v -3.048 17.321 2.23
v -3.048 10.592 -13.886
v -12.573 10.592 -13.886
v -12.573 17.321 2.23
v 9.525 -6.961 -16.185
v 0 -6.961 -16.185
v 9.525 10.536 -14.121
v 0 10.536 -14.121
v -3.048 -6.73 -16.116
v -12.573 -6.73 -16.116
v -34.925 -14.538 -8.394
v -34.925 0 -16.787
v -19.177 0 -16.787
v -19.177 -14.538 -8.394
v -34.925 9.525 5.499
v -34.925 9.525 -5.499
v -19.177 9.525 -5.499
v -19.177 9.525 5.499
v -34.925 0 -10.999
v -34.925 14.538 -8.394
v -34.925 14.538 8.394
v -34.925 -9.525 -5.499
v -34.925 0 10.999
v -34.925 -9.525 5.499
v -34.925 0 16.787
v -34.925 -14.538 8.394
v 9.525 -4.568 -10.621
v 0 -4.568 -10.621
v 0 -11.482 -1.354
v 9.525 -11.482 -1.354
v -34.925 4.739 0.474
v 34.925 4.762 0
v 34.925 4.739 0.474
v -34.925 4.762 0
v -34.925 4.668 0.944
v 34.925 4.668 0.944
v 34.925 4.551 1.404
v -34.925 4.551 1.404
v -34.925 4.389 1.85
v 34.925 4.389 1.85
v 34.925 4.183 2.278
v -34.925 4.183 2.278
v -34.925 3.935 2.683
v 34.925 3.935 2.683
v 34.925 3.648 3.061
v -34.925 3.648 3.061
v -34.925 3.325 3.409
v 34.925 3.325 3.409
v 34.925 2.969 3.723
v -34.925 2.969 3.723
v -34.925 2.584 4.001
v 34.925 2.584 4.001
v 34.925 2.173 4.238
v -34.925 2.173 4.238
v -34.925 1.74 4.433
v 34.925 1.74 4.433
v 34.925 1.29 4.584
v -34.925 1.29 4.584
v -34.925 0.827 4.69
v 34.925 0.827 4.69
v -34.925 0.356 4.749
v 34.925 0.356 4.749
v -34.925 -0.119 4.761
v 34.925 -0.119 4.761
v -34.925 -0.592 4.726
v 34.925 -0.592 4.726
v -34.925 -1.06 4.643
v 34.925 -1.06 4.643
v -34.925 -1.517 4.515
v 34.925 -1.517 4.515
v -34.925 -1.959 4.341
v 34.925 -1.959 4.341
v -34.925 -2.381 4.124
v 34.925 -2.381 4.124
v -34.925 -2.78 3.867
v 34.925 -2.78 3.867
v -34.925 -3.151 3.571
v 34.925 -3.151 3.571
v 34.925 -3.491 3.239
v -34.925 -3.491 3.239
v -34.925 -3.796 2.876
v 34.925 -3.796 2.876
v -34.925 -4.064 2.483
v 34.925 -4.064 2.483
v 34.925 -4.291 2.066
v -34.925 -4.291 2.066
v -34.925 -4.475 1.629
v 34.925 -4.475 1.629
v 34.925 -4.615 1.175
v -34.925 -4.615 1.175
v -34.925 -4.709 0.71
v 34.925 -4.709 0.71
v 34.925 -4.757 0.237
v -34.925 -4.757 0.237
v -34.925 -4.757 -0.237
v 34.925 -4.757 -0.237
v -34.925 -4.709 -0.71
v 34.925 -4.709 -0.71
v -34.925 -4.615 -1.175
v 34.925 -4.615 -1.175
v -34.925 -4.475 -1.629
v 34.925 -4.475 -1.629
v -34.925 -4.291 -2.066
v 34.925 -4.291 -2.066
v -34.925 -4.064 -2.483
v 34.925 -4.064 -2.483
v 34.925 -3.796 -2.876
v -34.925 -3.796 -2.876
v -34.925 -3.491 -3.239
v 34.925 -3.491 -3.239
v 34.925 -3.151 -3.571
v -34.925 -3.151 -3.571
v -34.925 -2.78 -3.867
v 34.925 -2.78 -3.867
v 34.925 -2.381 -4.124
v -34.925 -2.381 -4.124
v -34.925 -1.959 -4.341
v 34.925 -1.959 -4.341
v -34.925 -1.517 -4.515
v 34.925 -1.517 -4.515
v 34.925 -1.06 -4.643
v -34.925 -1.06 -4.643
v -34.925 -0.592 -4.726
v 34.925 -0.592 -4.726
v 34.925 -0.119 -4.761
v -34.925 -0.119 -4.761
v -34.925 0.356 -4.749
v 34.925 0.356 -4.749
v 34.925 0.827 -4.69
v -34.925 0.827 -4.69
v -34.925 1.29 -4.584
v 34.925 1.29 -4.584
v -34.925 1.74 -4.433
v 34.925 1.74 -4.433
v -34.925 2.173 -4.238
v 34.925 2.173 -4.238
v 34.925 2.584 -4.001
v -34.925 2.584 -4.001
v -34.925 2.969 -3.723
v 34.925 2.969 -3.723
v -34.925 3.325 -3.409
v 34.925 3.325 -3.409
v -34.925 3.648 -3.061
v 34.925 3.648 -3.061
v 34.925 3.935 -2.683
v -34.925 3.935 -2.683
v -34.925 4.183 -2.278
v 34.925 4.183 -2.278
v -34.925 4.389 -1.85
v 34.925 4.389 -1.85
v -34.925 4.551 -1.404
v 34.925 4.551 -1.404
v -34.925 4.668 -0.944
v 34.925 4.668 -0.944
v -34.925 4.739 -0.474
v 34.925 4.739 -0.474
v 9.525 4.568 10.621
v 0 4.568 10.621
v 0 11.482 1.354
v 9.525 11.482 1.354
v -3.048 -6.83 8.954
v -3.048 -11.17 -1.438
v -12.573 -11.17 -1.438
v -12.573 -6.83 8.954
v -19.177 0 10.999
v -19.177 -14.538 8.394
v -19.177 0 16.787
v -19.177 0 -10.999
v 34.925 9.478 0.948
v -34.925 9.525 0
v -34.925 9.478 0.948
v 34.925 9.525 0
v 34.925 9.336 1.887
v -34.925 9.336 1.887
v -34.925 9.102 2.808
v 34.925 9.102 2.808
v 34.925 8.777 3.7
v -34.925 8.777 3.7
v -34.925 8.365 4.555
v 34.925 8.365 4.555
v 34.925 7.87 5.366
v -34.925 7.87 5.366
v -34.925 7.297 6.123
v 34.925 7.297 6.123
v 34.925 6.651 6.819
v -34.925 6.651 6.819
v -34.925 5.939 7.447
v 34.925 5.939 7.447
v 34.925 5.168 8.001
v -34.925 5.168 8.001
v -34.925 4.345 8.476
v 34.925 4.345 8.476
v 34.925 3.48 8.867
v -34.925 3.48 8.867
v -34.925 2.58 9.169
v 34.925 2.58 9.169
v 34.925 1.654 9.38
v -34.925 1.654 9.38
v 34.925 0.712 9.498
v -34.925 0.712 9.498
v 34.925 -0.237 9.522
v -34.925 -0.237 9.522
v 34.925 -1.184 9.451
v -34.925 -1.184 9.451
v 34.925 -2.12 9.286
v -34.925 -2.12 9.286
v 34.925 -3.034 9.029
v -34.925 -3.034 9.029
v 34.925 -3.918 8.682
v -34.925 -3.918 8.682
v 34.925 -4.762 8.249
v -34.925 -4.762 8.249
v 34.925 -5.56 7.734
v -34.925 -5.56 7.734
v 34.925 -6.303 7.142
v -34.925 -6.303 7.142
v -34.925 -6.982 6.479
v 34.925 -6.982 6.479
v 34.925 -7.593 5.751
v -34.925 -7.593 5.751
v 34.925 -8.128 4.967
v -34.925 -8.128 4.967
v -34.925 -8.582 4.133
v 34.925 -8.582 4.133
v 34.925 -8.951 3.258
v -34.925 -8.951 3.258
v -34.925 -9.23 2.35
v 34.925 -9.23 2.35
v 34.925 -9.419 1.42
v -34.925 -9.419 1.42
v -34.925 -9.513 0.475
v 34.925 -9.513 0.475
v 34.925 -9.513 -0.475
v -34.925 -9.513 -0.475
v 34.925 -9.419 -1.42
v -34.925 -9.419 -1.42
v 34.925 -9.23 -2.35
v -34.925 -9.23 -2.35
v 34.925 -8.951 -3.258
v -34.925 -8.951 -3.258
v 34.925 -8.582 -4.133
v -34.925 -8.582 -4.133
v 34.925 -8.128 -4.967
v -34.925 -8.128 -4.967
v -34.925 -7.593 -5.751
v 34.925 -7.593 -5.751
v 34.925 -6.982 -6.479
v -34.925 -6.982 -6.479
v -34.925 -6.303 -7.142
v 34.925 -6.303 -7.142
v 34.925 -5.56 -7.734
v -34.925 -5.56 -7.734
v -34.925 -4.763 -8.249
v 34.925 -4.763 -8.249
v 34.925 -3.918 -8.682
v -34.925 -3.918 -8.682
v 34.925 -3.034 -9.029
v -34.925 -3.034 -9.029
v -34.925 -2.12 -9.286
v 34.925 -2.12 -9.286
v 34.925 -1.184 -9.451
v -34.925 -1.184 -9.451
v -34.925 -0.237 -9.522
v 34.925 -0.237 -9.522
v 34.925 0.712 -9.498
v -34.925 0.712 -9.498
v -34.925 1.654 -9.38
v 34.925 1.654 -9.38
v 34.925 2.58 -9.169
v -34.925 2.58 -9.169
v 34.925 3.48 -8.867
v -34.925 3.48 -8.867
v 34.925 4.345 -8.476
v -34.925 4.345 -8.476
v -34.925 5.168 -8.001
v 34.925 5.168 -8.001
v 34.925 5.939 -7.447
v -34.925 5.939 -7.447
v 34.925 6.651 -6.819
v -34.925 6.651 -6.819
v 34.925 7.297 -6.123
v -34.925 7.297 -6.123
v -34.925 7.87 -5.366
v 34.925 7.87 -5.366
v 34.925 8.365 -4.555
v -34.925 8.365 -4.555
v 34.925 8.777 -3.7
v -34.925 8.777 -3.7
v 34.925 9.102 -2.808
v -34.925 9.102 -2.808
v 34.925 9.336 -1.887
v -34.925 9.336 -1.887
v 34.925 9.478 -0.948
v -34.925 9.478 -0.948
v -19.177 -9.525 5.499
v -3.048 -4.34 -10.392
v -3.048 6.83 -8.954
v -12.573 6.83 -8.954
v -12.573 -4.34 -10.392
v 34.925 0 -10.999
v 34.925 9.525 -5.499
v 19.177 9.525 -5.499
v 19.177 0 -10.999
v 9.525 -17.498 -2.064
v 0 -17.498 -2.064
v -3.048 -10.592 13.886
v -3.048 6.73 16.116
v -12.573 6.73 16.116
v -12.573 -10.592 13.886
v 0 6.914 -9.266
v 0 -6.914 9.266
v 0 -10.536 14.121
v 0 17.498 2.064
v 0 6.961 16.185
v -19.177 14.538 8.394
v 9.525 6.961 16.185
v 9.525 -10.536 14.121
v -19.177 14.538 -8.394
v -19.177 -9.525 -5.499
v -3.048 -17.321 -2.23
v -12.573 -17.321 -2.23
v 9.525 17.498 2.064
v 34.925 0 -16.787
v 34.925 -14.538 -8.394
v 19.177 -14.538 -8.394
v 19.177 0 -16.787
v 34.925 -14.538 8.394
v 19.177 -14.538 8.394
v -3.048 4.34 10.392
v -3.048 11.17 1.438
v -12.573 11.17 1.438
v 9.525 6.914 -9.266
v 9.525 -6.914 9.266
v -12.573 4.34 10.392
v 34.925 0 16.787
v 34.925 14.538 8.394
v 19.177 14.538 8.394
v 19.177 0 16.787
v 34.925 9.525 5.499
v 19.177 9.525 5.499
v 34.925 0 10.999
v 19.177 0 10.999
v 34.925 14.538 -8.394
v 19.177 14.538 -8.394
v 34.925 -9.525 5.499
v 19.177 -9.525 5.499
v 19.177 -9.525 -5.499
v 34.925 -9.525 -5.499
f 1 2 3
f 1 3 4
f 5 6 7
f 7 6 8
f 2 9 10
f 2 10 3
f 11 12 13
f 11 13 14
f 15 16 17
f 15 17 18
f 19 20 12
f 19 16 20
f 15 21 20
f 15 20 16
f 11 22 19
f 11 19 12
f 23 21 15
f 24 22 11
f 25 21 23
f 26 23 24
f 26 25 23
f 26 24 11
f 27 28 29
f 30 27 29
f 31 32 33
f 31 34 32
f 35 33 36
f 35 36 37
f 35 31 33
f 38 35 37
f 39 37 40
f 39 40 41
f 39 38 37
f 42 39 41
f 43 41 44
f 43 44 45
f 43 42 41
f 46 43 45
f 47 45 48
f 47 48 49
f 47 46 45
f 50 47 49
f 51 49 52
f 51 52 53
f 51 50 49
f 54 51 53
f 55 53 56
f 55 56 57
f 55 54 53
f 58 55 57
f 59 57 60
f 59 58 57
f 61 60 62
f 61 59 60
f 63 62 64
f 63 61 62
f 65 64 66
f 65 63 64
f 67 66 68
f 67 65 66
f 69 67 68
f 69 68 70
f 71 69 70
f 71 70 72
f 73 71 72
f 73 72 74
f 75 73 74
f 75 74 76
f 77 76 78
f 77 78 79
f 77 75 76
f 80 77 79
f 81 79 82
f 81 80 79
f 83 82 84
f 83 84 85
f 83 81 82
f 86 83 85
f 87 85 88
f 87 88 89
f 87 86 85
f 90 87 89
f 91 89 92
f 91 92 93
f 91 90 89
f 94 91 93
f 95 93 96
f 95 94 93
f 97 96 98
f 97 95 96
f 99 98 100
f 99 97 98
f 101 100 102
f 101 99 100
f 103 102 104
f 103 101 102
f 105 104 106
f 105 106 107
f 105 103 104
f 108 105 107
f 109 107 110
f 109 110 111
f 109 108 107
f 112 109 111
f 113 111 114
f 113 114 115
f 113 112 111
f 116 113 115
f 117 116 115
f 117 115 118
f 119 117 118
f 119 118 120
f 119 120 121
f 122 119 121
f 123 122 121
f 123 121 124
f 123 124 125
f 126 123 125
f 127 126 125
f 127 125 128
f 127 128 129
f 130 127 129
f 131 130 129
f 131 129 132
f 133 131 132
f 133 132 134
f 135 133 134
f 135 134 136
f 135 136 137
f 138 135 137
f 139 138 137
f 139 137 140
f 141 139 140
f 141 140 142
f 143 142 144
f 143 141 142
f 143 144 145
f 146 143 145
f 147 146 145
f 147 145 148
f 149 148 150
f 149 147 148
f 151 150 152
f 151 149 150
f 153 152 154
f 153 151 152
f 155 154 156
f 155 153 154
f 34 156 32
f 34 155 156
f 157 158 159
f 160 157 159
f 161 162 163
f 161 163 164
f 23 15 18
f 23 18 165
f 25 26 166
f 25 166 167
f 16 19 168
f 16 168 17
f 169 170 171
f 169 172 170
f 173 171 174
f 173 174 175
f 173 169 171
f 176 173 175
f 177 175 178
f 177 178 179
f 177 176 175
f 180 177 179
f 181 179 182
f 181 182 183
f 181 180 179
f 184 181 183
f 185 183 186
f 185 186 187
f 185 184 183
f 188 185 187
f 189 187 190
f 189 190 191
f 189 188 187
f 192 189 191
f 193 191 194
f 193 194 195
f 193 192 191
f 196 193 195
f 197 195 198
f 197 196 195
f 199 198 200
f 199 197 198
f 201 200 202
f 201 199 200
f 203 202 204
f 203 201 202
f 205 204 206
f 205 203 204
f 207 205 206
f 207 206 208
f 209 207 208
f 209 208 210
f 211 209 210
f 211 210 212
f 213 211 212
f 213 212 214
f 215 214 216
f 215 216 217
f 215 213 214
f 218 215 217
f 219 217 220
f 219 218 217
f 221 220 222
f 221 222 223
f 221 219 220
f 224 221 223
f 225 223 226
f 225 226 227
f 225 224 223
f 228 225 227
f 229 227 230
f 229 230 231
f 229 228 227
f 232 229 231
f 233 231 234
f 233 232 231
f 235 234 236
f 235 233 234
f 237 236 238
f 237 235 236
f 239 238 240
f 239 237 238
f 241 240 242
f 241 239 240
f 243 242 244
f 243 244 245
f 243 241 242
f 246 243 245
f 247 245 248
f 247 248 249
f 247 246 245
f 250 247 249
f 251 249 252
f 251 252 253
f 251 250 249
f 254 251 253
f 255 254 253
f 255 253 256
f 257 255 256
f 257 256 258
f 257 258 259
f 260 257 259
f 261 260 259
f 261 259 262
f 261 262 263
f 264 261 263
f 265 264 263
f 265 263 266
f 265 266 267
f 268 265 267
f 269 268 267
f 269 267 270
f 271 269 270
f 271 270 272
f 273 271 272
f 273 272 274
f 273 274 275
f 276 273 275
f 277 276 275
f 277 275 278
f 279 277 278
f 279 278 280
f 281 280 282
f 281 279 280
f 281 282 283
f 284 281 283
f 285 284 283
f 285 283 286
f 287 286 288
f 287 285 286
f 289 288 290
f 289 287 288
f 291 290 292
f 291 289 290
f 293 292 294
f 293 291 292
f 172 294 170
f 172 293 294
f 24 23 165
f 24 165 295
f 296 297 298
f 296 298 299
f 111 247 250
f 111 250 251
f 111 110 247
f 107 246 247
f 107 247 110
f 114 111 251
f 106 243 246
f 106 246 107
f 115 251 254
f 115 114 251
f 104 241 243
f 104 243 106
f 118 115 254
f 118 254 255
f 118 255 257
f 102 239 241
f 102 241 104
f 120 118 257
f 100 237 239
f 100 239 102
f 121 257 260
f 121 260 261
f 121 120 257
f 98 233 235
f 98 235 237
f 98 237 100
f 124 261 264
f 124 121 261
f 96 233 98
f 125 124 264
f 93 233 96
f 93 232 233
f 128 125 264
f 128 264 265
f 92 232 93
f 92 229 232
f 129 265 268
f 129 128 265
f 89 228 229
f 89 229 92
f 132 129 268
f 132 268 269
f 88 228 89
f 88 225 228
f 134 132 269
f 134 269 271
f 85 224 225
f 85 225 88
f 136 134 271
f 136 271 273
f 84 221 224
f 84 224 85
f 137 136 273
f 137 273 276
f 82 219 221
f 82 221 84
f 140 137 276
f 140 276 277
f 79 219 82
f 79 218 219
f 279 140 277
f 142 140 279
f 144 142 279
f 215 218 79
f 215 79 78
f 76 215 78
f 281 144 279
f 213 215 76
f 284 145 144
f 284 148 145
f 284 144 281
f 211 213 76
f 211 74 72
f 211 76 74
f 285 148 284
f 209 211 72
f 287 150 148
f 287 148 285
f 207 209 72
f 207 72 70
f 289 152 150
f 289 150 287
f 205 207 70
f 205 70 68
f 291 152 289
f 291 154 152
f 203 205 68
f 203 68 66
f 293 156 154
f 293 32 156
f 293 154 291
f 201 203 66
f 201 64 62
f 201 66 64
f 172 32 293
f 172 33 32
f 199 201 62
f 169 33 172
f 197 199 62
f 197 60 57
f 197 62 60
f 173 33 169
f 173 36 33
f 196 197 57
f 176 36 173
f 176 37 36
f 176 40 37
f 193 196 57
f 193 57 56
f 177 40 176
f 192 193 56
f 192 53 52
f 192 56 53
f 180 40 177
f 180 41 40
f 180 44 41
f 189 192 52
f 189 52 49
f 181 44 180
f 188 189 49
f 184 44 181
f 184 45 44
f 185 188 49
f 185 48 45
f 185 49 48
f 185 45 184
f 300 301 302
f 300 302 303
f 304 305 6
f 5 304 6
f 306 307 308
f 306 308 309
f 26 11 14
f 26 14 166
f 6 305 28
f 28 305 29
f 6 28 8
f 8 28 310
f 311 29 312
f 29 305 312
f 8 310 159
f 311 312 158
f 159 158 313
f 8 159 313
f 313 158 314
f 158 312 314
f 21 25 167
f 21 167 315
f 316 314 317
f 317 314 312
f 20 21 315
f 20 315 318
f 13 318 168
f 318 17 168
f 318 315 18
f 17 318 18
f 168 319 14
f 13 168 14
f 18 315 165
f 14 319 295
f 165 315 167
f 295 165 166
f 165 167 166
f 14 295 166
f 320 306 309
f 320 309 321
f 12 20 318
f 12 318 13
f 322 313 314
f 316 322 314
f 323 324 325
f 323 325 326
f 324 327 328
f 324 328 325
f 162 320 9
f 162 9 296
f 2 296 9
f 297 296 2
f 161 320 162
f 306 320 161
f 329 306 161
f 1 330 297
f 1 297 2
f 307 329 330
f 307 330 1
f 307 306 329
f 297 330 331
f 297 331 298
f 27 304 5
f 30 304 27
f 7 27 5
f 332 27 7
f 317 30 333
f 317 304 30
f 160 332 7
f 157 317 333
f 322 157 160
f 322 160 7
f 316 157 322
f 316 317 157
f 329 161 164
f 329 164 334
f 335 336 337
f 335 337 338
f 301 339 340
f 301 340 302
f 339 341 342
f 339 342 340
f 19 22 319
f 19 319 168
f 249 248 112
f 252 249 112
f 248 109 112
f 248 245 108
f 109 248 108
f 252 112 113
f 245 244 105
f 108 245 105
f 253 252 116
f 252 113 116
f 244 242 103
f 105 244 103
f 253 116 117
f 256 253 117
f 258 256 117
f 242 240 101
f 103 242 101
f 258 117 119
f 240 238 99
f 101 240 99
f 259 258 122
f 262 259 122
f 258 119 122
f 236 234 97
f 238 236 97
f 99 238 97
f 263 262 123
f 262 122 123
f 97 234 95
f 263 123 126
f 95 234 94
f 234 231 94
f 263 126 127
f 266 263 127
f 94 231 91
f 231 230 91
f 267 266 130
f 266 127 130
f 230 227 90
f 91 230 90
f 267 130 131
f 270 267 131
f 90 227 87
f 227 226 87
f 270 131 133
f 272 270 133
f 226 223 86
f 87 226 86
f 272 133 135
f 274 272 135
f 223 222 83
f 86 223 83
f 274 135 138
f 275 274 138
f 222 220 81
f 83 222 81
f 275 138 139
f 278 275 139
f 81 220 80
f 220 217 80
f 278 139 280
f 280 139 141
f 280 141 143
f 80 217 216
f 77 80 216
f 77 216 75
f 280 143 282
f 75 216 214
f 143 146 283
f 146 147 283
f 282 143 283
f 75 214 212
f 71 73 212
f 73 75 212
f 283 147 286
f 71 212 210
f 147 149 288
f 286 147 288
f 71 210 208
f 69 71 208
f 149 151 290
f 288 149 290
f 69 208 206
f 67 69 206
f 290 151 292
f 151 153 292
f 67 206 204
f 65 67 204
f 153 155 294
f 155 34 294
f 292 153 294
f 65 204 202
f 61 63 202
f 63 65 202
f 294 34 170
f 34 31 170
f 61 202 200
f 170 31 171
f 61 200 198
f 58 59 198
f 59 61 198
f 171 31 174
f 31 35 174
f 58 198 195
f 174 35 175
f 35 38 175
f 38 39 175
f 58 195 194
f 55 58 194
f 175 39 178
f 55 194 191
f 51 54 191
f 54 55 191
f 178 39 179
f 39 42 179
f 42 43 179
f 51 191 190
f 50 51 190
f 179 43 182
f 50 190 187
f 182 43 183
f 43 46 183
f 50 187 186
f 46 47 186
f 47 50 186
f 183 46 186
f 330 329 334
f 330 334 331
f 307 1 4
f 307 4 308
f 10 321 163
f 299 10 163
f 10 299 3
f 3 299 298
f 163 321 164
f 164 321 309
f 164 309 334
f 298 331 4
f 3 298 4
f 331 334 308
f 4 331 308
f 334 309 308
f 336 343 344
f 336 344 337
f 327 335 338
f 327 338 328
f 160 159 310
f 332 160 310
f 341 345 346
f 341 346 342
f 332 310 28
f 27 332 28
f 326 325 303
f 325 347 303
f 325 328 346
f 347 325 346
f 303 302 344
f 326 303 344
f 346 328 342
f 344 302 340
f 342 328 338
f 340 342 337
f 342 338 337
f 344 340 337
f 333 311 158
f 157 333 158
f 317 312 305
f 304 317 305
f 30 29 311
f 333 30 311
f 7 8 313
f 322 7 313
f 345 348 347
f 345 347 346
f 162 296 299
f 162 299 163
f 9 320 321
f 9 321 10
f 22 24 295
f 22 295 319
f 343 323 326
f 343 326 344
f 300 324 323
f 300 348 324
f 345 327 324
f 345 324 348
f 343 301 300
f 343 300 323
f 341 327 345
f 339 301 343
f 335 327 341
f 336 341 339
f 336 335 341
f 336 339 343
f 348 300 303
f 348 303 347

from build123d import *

# Parameters (mm, degrees)
F0_R      = 9.525
F0_R_2    = 4.7625
F1_DEPTH  = 34.925
F3_DEPTH  = 9.525
F6_DEPTH  = 9.525
F8_DEPTH  = 15.748
F10_DEPTH = 15.748


with BuildPart() as f1:
    # F0 (on Right) → F1 (new body, symmetric)
    with BuildSketch(Plane.YZ):
        Circle(F0_R)
        Circle(F0_R_2, mode=Mode.SUBTRACT)
    extrude(amount=F1_DEPTH, both=True)


with BuildPart() as f3:
    # F2 (on Right) → F3 (new body)
    with BuildSketch(Plane.YZ):
        Polygon((10.536149, -14.121386), (17.497554, 2.06388), (6.961405, 16.185266), (-10.536149, 14.121386), (-17.497554, -2.06388), (-6.961405, -16.185266), align=None)
        Polygon((4.56799, 10.620576), (11.481684, 1.354293), (6.913694, -9.266283), (-4.56799, -10.620576), (-11.481684, -1.354293), (-6.913694, 9.266283), align=None, mode=Mode.SUBTRACT)
    extrude(amount=F3_DEPTH)


with BuildPart() as f6:
    # F5 (on offset) → F6 (new body)
    with BuildSketch(Plane.YZ.offset(-3.048)):
        Polygon((-10.591738, 13.885817), (-17.321339, -2.229806), (-6.729601, -16.115623), (10.591738, -13.885817), (17.321339, 2.229806), (6.729601, 16.115623), align=None)
        Polygon((-4.33959, -10.392176), (-11.169684, -1.437893), (-6.830094, 8.954284), (4.33959, 10.392176), (11.169684, 1.437893), (6.830094, -8.954284), align=None, mode=Mode.SUBTRACT)
    extrude(amount=-F6_DEPTH)


with BuildPart() as f8:
    # F7 (on face) → F8 (new body)
    with BuildSketch(Plane.YZ.offset(34.925)):
        Polygon((14.538282, -8.393681), (14.538282, 8.393681), (0, 16.787362), (-14.538282, 8.393681), (-14.538282, -8.393681), (0, -16.787362), align=None)
        Polygon((0, 10.998523), (9.525, 5.499261), (9.525, -5.499261), (0, -10.998523), (-9.525, -5.499261), (-9.525, 5.499261), align=None, mode=Mode.SUBTRACT)
    extrude(amount=-F8_DEPTH)


with BuildPart() as f10:
    # F9 (on face) → F10 (new body)
    with BuildSketch(Plane(origin=(-34.925, 0, 0), x_dir=(0, -1, 0), z_dir=(-1, 0, 0))):
        Polygon((14.538282, -8.393681), (14.538282, 8.393681), (0, 16.787362), (-14.538282, 8.393681), (-14.538282, -8.393681), (0, -16.787362), align=None)
        Polygon((0, 10.998523), (9.525, 5.499261), (9.525, -5.499261), (0, -10.998523), (-9.525, -5.499261), (-9.525, 5.499261), align=None, mode=Mode.SUBTRACT)
    extrude(amount=-F10_DEPTH)


solid = Compound([f1.part, f3.part, f6.part, f8.part, f10.part])
